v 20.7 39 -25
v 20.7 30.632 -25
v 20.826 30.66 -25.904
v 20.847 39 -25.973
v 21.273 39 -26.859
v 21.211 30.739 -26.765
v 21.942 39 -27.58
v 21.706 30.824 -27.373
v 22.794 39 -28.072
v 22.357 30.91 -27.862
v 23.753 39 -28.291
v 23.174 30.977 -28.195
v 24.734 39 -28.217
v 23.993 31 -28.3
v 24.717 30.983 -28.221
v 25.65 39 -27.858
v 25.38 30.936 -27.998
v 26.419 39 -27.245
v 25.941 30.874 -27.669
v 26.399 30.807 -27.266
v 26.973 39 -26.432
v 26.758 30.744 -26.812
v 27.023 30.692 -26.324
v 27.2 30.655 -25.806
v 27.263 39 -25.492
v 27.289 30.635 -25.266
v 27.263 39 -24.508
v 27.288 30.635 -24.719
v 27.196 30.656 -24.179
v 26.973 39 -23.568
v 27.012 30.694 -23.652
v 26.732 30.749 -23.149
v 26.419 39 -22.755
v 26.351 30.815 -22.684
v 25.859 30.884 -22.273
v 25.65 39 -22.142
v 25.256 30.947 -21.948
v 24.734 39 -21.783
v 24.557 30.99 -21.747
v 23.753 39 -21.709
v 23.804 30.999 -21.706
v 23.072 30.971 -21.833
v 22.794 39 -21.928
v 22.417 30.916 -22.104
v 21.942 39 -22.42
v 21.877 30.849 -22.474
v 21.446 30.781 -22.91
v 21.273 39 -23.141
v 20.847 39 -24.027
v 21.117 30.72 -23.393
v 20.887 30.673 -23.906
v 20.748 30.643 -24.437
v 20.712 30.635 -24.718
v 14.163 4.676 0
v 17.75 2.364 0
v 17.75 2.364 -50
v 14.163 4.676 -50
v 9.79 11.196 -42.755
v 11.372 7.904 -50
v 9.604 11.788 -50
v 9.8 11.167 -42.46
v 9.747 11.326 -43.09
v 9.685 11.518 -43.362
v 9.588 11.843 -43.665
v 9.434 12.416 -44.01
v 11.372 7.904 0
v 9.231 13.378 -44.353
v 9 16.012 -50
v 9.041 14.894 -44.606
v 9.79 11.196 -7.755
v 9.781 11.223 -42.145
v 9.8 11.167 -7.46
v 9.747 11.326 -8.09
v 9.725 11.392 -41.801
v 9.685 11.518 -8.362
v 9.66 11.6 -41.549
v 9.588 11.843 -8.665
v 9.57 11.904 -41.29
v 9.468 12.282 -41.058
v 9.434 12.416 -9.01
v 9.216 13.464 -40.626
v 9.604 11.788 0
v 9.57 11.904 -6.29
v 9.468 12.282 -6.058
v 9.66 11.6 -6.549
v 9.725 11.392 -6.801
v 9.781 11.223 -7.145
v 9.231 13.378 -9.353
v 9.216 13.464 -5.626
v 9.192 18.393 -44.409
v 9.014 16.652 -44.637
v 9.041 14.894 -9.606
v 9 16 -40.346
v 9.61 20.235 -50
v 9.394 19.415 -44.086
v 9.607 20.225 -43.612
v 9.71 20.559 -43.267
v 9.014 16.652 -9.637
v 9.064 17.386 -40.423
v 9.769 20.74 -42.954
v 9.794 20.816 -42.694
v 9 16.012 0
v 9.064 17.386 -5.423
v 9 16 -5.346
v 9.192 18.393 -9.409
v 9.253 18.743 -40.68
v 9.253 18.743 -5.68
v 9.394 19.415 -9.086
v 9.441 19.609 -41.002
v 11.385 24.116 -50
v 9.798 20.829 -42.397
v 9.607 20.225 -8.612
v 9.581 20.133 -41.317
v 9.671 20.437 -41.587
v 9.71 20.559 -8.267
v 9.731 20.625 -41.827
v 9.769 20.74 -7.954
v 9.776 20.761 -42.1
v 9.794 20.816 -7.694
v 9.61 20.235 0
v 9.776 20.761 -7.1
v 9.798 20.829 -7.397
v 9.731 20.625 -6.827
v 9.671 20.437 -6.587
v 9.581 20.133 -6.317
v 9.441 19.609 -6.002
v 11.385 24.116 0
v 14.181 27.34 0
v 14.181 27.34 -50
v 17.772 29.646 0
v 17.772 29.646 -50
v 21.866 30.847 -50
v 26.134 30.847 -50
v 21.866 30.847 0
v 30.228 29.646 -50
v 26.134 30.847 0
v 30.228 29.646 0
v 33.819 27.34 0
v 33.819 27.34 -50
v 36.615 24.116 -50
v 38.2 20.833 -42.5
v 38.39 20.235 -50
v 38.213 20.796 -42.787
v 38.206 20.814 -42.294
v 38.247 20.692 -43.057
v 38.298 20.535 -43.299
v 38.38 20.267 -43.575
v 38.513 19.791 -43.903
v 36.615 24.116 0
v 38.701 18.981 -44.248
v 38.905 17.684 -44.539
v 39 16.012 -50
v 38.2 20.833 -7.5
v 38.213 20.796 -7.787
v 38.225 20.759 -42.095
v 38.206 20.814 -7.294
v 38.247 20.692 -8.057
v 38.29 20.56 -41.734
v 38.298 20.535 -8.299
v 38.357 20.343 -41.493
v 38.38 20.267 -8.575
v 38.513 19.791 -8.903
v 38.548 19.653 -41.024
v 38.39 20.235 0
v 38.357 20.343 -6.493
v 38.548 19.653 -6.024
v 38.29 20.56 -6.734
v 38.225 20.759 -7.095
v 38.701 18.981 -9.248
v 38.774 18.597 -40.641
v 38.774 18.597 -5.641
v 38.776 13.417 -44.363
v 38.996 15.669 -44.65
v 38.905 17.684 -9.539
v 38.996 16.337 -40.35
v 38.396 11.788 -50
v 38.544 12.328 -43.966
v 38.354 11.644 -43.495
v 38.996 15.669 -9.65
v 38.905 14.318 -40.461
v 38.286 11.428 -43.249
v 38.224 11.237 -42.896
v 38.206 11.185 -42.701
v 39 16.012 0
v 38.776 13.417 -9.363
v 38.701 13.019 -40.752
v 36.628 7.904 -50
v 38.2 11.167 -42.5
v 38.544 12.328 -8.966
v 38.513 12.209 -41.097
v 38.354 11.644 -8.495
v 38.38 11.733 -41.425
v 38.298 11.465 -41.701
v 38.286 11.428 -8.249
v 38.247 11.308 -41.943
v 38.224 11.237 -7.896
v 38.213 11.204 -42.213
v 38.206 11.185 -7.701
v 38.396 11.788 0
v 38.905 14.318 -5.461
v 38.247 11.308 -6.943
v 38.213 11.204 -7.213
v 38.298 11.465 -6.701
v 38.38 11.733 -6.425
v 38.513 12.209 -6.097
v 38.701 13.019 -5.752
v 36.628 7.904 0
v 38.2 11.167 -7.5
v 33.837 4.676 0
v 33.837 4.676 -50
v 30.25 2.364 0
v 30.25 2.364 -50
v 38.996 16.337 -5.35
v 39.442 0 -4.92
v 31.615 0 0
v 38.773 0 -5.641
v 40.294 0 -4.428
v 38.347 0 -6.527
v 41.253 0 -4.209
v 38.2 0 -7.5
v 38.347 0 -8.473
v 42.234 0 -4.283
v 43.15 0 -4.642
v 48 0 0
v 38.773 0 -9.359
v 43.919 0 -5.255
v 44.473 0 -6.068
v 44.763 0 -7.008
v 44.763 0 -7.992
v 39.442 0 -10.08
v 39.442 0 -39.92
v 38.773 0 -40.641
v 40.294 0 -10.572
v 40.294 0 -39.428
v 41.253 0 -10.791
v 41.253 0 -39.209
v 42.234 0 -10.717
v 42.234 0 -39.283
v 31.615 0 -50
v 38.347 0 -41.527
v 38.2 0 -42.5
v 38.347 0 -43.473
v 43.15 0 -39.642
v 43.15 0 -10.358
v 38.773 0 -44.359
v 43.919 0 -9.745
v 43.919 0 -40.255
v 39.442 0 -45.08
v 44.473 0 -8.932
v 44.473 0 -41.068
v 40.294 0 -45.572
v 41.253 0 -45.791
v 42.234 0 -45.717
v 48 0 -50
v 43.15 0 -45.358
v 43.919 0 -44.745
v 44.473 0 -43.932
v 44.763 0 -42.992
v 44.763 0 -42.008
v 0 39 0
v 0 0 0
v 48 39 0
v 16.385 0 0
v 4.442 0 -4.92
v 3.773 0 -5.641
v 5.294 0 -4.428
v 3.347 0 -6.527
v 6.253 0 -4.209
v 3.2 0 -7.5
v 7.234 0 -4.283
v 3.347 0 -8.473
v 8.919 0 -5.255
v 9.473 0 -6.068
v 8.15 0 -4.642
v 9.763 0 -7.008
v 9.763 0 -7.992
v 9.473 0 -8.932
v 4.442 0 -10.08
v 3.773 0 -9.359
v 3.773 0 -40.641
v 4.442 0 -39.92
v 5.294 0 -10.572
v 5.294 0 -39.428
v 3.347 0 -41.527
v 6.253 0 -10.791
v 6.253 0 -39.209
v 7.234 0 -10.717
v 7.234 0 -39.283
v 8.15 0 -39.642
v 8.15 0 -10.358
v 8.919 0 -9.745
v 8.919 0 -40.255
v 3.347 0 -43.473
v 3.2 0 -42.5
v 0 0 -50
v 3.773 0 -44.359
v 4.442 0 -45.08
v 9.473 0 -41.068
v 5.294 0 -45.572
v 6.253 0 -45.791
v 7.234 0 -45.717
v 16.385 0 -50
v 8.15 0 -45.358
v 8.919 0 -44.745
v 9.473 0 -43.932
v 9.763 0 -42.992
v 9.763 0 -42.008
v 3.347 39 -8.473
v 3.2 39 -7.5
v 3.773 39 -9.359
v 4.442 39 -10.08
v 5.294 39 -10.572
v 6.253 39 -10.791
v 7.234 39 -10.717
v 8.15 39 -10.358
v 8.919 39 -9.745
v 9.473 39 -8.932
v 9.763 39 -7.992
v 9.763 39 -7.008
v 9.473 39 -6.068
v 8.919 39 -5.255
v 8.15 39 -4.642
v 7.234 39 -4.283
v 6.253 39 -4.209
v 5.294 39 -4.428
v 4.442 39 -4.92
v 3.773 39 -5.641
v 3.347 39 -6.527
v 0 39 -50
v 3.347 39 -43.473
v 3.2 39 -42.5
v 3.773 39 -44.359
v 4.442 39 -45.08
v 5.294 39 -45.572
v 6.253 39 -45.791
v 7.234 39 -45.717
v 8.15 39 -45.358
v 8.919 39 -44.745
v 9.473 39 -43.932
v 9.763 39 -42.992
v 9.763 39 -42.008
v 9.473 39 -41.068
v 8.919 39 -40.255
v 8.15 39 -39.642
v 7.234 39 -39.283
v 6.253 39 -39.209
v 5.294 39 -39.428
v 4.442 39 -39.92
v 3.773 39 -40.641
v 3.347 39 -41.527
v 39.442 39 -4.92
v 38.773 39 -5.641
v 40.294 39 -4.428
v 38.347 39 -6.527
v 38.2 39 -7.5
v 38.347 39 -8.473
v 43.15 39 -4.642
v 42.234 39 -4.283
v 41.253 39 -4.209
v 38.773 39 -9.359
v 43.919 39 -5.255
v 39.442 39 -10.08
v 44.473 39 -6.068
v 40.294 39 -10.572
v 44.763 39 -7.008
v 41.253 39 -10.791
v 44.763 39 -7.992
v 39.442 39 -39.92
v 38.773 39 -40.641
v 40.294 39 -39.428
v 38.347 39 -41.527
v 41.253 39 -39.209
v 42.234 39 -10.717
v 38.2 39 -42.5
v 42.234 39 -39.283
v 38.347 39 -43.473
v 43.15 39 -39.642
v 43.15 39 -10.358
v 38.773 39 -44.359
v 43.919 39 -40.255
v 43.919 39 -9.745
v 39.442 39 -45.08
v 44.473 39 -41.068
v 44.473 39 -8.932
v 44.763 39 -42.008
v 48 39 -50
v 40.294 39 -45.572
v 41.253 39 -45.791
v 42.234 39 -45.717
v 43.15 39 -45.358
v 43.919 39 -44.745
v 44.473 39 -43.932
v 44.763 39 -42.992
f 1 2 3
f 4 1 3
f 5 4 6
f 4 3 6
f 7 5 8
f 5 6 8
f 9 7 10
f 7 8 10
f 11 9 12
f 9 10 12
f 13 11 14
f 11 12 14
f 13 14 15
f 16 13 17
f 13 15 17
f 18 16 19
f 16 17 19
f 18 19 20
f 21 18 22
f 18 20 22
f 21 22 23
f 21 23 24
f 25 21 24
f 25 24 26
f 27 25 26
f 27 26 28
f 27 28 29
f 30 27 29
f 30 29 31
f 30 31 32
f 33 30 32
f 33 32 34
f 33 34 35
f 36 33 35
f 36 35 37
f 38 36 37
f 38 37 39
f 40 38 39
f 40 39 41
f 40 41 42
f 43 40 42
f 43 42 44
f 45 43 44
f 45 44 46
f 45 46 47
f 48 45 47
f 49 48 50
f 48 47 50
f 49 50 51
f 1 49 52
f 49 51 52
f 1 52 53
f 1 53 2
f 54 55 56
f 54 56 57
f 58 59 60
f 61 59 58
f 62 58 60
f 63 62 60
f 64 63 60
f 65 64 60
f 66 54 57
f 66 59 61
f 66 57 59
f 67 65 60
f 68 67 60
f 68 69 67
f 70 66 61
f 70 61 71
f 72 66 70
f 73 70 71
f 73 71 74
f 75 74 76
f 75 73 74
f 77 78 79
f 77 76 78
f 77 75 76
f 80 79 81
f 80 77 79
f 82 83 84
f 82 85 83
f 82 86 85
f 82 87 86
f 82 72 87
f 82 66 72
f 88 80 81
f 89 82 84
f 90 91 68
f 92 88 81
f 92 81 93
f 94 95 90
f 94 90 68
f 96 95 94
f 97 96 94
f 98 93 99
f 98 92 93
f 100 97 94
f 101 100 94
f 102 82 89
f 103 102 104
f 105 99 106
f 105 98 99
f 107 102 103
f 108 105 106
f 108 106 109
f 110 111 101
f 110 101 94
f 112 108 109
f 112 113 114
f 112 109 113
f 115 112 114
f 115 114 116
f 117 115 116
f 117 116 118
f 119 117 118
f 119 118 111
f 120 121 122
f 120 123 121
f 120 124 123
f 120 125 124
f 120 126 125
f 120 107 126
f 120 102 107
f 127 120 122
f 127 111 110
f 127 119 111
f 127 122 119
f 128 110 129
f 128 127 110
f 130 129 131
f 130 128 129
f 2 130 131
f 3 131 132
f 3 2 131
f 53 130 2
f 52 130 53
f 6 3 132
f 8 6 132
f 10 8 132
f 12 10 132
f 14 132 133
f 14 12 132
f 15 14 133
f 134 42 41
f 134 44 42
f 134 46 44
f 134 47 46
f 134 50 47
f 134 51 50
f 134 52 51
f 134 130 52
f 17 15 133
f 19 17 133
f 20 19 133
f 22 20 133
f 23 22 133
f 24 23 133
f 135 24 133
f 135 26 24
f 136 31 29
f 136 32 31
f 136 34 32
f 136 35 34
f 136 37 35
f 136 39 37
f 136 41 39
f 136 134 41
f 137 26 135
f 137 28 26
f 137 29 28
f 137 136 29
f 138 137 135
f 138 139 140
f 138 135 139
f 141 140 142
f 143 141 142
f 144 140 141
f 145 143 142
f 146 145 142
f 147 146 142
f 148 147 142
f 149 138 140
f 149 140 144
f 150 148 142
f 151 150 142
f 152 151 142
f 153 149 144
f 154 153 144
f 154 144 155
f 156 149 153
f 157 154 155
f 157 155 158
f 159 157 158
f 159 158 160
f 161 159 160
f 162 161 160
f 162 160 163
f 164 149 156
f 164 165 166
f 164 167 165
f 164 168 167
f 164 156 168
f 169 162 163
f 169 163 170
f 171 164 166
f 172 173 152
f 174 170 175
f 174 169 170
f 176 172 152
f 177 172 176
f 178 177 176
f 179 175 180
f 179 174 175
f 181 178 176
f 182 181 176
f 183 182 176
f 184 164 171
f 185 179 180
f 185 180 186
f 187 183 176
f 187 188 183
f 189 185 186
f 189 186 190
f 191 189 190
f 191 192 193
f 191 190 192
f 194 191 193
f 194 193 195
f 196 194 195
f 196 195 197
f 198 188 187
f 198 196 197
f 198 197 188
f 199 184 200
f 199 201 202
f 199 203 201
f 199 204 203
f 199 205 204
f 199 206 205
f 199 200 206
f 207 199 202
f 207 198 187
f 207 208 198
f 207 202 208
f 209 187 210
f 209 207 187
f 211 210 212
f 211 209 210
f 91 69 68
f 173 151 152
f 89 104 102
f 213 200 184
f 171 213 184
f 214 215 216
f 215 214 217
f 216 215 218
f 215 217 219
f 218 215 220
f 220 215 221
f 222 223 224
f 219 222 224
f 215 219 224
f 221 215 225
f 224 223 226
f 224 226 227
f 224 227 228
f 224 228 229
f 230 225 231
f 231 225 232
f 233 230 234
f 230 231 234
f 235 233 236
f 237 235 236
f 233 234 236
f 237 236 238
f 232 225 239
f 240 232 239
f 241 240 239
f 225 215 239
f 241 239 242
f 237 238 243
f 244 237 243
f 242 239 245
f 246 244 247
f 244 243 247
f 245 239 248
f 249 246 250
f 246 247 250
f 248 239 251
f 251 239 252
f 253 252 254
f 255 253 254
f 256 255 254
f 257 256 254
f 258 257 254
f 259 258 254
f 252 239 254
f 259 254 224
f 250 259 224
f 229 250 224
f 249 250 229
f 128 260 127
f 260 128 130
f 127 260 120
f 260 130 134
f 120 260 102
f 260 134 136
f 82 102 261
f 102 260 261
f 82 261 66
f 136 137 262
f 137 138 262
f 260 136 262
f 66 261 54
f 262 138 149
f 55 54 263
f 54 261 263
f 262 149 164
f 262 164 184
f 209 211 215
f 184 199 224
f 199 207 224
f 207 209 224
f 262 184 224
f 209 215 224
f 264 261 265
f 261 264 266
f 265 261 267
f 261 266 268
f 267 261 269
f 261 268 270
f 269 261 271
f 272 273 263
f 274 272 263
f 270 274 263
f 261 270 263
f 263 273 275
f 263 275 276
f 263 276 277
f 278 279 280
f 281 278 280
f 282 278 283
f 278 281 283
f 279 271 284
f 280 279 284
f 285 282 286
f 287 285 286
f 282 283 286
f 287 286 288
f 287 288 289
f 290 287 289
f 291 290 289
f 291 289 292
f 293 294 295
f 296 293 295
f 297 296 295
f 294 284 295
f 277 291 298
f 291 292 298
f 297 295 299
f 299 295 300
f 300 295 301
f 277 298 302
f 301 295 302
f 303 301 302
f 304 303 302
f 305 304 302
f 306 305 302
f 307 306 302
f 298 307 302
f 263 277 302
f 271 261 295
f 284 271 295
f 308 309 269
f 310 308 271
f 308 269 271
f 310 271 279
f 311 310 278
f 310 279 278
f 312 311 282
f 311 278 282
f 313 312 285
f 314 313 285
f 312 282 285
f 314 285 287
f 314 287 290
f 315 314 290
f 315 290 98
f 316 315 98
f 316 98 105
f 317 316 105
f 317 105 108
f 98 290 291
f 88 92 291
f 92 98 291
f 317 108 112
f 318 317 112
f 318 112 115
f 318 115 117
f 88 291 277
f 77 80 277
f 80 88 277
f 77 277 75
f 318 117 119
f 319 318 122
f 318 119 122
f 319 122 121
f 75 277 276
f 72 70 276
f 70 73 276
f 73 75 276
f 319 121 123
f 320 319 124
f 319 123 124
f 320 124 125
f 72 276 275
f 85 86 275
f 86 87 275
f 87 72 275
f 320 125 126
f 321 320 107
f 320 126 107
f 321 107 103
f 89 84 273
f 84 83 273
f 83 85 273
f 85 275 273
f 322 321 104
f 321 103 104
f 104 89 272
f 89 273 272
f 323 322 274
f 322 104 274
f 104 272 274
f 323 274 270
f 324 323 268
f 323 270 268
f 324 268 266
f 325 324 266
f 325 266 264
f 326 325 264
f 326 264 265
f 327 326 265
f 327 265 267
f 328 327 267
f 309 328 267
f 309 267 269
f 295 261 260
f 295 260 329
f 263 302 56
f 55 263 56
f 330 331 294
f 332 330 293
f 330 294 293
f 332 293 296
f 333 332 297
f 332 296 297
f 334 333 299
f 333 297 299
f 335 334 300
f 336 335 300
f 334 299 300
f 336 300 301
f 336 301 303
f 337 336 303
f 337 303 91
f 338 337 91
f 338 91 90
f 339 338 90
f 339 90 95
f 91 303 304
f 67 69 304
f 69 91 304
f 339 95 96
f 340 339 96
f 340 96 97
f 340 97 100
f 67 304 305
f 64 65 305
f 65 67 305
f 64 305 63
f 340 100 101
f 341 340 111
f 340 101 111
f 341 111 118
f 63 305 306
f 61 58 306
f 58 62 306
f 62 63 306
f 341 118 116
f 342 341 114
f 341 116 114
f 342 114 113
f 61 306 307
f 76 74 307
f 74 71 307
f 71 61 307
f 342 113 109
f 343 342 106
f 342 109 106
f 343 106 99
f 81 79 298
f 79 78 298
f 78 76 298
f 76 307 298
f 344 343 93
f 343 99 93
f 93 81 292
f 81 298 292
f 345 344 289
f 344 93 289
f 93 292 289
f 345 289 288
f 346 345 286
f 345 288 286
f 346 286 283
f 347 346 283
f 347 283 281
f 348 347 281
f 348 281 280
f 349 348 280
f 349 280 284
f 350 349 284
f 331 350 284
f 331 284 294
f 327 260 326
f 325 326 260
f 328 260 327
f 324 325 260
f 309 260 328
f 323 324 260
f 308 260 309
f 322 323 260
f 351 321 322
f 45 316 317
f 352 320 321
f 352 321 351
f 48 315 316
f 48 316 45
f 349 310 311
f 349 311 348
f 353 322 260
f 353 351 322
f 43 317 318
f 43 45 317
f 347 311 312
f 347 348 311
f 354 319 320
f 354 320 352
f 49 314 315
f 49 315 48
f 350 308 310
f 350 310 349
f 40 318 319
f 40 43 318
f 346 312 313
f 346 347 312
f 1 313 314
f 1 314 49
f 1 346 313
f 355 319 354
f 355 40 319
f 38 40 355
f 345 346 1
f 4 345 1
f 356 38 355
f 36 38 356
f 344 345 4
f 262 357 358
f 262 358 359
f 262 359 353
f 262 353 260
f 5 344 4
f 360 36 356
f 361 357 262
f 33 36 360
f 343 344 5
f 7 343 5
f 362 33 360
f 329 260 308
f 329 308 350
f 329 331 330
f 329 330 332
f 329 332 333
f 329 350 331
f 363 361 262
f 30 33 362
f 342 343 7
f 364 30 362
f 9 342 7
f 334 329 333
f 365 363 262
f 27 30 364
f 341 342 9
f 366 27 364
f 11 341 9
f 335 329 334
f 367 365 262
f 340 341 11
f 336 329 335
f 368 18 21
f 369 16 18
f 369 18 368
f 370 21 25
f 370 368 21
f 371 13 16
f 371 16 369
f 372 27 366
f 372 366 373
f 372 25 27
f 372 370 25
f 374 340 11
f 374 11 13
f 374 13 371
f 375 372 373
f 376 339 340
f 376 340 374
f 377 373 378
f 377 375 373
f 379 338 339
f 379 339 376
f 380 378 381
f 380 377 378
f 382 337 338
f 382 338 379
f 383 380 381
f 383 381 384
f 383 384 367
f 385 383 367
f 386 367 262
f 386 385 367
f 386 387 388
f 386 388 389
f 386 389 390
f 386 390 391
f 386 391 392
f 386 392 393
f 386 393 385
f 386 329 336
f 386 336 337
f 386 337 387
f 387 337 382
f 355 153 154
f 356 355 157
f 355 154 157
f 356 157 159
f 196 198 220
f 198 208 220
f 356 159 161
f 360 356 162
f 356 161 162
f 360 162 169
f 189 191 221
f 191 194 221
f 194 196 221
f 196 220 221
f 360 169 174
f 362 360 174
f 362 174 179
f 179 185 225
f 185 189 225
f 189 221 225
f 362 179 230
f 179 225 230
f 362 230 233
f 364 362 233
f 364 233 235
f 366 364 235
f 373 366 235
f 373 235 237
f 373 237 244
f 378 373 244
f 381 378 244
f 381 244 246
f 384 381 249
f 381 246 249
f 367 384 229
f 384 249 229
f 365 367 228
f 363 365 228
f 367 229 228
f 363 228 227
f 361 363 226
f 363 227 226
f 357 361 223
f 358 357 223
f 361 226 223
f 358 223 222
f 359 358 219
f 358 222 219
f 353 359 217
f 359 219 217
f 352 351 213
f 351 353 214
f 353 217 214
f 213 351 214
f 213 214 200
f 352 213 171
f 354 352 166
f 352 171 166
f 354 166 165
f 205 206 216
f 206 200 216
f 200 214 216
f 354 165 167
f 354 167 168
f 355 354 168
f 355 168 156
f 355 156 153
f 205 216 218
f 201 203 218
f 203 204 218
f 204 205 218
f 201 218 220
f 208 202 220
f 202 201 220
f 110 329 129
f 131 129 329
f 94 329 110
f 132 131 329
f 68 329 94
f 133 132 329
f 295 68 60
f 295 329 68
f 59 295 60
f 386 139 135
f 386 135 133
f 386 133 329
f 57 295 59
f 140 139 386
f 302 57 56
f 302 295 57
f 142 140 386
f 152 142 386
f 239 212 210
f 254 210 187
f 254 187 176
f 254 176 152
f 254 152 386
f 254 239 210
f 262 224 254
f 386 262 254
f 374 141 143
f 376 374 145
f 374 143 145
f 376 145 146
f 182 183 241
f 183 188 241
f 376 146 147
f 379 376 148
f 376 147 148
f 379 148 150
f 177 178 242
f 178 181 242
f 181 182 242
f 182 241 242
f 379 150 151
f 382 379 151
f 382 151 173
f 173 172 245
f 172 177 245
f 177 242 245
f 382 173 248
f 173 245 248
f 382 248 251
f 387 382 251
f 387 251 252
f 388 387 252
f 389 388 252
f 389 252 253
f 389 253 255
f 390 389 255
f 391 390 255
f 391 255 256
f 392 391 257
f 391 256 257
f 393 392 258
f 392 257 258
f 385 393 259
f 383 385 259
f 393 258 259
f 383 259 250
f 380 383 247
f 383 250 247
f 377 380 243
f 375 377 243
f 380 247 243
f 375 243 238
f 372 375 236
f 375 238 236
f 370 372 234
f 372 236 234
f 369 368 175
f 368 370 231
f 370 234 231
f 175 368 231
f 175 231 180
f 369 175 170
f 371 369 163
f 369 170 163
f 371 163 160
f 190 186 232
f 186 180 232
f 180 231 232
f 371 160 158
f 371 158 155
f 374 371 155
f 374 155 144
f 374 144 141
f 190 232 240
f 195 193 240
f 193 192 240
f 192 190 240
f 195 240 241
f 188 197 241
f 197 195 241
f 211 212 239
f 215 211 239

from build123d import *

# Parameters (mm, degrees)
SKETCH1_W            = 48
SKETCH1_H            = 50
BOSS_EXTRUDE1_DEPTH  = 39
M6_CLEARANCE_HOLE1_D = 6.6
CUT_EXTRUDE1_DEPTH   = 80.529868603


with BuildPart() as part:
    # Sketch1 → Boss-Extrude1 (new body)
    with BuildSketch(Plane(origin=(0, 0, 0), x_dir=(1, 0, 0), z_dir=(0, 1, 0))):
        with Locations((24, 25)):
            Rectangle(SKETCH1_W, SKETCH1_H)
    extrude(amount=BOSS_EXTRUDE1_DEPTH)

    # M6 Clearance Hole1 (through all)
    with Locations(Plane(origin=(0, 39, 0), x_dir=(1, 0, 0), z_dir=(0, 1, 0))):
        with Locations((6.5, 42.5), (41.5, 42.5), (41.5, 7.5), (6.5, 7.5), (24, 25)):
            Hole(M6_CLEARANCE_HOLE1_D / 2)

    # Sketch4 → Cut-Extrude1 (cut, through all)
    with BuildSketch(Plane.XY):
        with BuildLine():
            Line((30.25, 2.364109857), (31.614919462, 0))
            Line((31.614919462, 0), (16.385080538, 0))
            Line((16.385080538, 0), (17.75, 2.364109857))
            ThreePointArc((17.75, 2.364109857), (24, 31), (30.25, 2.364109857))
        make_face()
    extrude(amount=-CUT_EXTRUDE1_DEPTH, mode=Mode.SUBTRACT)


solid = part.part
